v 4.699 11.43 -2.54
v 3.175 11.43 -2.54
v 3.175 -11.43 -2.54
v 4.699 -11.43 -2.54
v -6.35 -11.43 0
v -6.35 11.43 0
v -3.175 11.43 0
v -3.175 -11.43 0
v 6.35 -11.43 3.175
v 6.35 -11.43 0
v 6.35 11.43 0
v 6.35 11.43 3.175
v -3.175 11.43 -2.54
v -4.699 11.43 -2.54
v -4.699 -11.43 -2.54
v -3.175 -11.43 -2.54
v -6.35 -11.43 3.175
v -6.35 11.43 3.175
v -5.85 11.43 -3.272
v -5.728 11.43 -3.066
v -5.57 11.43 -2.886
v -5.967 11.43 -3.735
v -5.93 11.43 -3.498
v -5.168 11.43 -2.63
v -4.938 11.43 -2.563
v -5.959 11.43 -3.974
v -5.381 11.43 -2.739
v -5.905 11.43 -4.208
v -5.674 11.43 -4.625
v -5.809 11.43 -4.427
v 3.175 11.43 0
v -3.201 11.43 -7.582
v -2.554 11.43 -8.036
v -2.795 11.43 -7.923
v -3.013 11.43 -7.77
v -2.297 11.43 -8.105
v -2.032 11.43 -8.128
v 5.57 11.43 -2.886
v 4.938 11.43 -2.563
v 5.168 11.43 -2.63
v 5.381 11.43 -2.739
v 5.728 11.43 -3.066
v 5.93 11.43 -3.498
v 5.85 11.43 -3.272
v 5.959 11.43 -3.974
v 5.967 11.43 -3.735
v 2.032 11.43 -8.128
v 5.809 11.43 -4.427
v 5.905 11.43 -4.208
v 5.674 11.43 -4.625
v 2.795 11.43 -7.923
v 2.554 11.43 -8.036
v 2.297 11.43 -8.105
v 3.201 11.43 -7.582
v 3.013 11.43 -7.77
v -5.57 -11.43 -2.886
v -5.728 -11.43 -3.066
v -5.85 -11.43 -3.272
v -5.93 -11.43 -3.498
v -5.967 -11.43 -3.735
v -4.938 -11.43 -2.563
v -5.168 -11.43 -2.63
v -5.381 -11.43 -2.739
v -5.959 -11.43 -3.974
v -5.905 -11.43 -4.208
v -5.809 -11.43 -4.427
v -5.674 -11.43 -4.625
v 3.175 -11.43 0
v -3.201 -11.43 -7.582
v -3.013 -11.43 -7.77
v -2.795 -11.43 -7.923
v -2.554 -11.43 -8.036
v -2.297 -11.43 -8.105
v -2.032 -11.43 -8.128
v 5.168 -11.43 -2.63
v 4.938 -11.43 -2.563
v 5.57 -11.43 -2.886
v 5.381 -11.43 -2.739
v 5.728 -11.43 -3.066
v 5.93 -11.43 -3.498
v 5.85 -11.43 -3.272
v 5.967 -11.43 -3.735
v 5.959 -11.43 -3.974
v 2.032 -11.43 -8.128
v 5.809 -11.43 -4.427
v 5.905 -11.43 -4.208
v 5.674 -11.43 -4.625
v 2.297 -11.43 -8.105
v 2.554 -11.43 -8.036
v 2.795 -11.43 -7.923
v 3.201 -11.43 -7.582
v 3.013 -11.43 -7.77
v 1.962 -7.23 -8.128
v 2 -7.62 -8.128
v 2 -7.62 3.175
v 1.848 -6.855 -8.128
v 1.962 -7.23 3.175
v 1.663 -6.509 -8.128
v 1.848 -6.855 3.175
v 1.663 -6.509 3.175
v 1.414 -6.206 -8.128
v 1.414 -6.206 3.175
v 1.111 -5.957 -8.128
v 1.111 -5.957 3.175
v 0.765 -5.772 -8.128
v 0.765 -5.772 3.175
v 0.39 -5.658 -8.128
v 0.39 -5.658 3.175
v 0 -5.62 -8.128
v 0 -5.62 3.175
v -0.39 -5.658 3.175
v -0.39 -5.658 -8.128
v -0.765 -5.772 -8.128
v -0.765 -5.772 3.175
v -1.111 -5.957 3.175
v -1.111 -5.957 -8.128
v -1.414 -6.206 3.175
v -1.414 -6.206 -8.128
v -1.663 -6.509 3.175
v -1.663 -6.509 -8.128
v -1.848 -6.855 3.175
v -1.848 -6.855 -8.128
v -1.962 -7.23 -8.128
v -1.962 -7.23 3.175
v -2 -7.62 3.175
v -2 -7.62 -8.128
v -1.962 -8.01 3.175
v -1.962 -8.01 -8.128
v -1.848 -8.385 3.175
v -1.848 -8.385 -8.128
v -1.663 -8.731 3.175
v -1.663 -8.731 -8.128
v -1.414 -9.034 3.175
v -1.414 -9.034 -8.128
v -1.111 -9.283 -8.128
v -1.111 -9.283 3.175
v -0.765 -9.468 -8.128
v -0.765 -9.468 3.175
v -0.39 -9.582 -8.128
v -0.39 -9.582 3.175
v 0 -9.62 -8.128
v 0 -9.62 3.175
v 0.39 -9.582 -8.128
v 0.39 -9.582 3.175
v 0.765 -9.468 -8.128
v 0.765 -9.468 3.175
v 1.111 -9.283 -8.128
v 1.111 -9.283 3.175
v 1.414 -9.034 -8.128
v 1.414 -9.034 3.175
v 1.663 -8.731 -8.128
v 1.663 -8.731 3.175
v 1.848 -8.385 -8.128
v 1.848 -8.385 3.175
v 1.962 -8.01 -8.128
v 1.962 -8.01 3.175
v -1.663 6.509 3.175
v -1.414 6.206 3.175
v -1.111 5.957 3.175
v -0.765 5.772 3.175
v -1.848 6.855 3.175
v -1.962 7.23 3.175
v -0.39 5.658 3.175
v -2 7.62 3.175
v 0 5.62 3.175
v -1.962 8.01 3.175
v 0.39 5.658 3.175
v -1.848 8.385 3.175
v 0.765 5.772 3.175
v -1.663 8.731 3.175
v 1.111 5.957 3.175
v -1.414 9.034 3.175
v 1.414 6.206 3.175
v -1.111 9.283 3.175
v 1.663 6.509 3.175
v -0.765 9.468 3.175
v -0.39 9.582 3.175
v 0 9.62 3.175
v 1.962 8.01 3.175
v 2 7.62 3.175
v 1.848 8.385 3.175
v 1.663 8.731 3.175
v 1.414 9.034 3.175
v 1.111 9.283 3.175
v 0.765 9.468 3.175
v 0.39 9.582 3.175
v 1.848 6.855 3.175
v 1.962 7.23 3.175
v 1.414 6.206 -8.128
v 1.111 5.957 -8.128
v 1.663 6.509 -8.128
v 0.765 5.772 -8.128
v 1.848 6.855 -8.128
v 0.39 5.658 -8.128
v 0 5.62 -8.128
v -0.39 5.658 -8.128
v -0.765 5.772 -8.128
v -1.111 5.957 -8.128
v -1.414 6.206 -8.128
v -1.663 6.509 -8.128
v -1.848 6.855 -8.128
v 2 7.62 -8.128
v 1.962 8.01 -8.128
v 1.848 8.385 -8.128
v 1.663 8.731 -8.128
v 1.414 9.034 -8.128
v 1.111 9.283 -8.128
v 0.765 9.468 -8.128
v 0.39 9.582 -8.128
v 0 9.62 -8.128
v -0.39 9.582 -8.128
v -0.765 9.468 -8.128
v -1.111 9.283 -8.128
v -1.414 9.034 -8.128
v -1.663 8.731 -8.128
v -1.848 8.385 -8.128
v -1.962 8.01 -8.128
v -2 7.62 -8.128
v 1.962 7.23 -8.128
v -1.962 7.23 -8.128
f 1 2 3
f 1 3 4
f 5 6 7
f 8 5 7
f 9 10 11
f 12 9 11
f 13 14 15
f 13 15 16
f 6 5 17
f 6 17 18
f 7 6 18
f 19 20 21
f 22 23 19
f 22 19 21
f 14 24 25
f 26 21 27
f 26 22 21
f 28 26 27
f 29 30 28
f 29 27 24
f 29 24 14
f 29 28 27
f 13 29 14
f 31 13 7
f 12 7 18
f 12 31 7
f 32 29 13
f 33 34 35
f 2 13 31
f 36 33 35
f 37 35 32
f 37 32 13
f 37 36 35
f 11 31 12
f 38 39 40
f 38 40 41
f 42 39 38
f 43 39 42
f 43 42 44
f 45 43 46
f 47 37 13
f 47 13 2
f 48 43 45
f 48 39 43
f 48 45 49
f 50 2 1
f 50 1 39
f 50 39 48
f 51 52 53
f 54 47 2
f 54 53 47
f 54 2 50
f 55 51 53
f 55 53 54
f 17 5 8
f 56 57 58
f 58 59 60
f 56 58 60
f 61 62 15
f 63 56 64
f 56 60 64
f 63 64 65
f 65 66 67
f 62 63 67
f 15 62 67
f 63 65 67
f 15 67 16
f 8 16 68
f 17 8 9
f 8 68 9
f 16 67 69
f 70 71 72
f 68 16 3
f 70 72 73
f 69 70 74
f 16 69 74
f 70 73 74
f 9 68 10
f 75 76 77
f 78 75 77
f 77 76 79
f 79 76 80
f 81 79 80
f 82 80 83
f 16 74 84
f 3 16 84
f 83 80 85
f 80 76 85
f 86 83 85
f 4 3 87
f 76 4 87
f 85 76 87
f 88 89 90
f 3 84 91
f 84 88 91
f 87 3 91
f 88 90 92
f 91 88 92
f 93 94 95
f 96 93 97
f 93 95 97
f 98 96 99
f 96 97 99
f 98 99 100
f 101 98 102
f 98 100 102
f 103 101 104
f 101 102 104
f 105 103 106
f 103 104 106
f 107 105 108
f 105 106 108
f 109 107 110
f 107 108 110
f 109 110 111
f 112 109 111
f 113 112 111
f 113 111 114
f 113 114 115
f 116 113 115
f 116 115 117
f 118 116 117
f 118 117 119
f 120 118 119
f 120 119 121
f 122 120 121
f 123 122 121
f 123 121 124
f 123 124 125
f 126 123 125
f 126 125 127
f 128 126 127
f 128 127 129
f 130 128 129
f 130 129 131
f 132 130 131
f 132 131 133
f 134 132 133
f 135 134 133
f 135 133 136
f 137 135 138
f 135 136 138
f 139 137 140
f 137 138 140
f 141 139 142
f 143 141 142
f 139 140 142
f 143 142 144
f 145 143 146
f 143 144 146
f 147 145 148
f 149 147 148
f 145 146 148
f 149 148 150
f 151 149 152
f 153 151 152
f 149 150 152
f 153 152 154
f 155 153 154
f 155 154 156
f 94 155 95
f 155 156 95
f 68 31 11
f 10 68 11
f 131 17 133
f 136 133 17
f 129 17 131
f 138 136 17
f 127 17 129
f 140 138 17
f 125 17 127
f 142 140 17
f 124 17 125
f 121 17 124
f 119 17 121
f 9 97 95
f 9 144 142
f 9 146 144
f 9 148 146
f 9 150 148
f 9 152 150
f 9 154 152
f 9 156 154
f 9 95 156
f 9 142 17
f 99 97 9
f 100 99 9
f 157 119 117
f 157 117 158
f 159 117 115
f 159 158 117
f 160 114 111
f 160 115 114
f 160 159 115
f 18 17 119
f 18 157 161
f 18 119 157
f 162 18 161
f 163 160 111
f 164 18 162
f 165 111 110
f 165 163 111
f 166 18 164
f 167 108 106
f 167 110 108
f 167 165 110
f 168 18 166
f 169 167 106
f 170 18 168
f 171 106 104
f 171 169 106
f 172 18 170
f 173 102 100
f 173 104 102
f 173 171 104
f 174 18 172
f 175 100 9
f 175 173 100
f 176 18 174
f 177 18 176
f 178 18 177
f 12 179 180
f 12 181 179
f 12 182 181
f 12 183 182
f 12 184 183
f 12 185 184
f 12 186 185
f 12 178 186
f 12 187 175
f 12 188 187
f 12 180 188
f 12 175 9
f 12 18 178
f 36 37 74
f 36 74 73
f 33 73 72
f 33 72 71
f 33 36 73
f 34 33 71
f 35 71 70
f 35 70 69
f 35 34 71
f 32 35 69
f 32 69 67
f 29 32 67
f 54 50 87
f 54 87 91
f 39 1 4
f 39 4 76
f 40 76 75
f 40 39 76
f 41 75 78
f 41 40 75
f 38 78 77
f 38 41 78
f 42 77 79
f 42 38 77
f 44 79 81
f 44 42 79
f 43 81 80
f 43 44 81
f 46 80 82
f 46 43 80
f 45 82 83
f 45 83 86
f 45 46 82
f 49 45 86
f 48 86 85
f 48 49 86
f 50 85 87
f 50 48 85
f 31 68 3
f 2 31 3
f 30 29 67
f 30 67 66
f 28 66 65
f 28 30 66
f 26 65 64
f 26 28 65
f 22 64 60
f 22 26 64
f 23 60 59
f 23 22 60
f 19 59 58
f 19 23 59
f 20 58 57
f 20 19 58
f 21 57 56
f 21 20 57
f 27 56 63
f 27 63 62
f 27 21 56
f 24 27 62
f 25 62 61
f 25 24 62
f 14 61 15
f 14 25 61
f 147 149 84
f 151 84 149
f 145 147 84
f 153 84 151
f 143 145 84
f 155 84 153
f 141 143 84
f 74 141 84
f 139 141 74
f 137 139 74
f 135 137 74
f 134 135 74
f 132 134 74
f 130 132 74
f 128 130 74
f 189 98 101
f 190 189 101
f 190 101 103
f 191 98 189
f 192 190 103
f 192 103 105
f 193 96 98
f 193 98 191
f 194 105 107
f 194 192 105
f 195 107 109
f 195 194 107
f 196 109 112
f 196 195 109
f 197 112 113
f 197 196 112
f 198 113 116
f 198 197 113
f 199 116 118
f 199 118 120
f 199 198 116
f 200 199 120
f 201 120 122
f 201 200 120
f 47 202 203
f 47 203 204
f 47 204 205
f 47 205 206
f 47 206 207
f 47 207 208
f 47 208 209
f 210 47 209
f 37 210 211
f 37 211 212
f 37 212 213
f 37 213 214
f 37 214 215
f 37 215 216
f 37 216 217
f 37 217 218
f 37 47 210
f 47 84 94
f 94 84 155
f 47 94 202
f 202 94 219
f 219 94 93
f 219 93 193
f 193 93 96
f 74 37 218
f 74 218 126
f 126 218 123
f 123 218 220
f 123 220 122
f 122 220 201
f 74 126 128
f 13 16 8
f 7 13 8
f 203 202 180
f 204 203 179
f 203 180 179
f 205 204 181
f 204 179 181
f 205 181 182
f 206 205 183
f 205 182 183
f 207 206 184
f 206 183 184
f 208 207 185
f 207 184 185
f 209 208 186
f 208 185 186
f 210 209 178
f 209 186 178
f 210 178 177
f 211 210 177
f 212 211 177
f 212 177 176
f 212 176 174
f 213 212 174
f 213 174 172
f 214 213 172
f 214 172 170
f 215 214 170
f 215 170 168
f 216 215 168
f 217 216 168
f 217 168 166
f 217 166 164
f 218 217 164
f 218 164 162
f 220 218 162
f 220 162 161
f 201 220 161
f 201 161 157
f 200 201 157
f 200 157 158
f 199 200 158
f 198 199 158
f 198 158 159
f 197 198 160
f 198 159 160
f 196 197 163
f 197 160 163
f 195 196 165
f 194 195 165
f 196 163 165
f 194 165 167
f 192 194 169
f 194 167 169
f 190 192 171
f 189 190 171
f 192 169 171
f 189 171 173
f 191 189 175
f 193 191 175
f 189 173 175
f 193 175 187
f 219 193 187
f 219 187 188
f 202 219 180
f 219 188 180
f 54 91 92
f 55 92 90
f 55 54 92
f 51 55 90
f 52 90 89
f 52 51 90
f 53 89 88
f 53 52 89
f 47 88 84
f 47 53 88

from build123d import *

# Parameters (mm, degrees)
SKETCH1_W           = 12.7
SKETCH1_H           = 22.86
BOSS_EXTRUDE1_DEPTH = 3.175
BOSS_EXTRUDE2_DEPTH = 22.86
SKETCH4_R           = 2
CUT_EXTRUDE1_DEPTH  = 18.283668852


with BuildPart() as part:
    # Sketch1 → Boss-Extrude1 (new body)
    with BuildSketch(Plane.XY):
        Rectangle(SKETCH1_W, SKETCH1_H)
    extrude(amount=BOSS_EXTRUDE1_DEPTH)

    # Sketch2 → Boss-Extrude2 (add)
    with BuildSketch(Plane(origin=(0, 11.43, 0), x_dir=(1, 0, 0), z_dir=(0, 1, 0))):
        with BuildLine():
            Line((3.175, 0), (3.175, 2.54))
            Line((3.175, 2.54), (4.699372999, 2.54))
            ThreePointArc((4.699372999, 2.54), (5.849922417, 3.272286288), (5.673650477, 4.624667659))
            Line((5.673650477, 4.624667659), (3.201132974, 7.581601191))
            ThreePointArc((3.201132974, 7.581601191), (2.677256455, 7.984659302), (2.032, 8.128))
            Line((2.032, 8.128), (-2.032, 8.128))
            ThreePointArc((-2.032, 8.128), (-2.677256455, 7.984659302), (-3.201132974, 7.581601191))
            Line((-3.201132974, 7.581601191), (-5.673650477, 4.624667659))
            ThreePointArc((-5.673650477, 4.624667659), (-5.849922417, 3.272286288), (-4.699372999, 2.54))
            Line((-4.699372999, 2.54), (-3.175, 2.54))
            Line((-3.175, 2.54), (-3.175, 0))
            Line((-3.175, 0), (3.175, 0))
        make_face()
    extrude(amount=-BOSS_EXTRUDE2_DEPTH)

    # Sketch4 → Cut-Extrude1 (cut, through all)
    with BuildSketch(Plane.XY.offset(3.175)):
        with Locations((0, 7.62)):
            Circle(SKETCH4_R)
        with Locations((0, -7.62)):
            Circle(SKETCH4_R)
    extrude(amount=-CUT_EXTRUDE1_DEPTH, mode=Mode.SUBTRACT)


solid = part.part
